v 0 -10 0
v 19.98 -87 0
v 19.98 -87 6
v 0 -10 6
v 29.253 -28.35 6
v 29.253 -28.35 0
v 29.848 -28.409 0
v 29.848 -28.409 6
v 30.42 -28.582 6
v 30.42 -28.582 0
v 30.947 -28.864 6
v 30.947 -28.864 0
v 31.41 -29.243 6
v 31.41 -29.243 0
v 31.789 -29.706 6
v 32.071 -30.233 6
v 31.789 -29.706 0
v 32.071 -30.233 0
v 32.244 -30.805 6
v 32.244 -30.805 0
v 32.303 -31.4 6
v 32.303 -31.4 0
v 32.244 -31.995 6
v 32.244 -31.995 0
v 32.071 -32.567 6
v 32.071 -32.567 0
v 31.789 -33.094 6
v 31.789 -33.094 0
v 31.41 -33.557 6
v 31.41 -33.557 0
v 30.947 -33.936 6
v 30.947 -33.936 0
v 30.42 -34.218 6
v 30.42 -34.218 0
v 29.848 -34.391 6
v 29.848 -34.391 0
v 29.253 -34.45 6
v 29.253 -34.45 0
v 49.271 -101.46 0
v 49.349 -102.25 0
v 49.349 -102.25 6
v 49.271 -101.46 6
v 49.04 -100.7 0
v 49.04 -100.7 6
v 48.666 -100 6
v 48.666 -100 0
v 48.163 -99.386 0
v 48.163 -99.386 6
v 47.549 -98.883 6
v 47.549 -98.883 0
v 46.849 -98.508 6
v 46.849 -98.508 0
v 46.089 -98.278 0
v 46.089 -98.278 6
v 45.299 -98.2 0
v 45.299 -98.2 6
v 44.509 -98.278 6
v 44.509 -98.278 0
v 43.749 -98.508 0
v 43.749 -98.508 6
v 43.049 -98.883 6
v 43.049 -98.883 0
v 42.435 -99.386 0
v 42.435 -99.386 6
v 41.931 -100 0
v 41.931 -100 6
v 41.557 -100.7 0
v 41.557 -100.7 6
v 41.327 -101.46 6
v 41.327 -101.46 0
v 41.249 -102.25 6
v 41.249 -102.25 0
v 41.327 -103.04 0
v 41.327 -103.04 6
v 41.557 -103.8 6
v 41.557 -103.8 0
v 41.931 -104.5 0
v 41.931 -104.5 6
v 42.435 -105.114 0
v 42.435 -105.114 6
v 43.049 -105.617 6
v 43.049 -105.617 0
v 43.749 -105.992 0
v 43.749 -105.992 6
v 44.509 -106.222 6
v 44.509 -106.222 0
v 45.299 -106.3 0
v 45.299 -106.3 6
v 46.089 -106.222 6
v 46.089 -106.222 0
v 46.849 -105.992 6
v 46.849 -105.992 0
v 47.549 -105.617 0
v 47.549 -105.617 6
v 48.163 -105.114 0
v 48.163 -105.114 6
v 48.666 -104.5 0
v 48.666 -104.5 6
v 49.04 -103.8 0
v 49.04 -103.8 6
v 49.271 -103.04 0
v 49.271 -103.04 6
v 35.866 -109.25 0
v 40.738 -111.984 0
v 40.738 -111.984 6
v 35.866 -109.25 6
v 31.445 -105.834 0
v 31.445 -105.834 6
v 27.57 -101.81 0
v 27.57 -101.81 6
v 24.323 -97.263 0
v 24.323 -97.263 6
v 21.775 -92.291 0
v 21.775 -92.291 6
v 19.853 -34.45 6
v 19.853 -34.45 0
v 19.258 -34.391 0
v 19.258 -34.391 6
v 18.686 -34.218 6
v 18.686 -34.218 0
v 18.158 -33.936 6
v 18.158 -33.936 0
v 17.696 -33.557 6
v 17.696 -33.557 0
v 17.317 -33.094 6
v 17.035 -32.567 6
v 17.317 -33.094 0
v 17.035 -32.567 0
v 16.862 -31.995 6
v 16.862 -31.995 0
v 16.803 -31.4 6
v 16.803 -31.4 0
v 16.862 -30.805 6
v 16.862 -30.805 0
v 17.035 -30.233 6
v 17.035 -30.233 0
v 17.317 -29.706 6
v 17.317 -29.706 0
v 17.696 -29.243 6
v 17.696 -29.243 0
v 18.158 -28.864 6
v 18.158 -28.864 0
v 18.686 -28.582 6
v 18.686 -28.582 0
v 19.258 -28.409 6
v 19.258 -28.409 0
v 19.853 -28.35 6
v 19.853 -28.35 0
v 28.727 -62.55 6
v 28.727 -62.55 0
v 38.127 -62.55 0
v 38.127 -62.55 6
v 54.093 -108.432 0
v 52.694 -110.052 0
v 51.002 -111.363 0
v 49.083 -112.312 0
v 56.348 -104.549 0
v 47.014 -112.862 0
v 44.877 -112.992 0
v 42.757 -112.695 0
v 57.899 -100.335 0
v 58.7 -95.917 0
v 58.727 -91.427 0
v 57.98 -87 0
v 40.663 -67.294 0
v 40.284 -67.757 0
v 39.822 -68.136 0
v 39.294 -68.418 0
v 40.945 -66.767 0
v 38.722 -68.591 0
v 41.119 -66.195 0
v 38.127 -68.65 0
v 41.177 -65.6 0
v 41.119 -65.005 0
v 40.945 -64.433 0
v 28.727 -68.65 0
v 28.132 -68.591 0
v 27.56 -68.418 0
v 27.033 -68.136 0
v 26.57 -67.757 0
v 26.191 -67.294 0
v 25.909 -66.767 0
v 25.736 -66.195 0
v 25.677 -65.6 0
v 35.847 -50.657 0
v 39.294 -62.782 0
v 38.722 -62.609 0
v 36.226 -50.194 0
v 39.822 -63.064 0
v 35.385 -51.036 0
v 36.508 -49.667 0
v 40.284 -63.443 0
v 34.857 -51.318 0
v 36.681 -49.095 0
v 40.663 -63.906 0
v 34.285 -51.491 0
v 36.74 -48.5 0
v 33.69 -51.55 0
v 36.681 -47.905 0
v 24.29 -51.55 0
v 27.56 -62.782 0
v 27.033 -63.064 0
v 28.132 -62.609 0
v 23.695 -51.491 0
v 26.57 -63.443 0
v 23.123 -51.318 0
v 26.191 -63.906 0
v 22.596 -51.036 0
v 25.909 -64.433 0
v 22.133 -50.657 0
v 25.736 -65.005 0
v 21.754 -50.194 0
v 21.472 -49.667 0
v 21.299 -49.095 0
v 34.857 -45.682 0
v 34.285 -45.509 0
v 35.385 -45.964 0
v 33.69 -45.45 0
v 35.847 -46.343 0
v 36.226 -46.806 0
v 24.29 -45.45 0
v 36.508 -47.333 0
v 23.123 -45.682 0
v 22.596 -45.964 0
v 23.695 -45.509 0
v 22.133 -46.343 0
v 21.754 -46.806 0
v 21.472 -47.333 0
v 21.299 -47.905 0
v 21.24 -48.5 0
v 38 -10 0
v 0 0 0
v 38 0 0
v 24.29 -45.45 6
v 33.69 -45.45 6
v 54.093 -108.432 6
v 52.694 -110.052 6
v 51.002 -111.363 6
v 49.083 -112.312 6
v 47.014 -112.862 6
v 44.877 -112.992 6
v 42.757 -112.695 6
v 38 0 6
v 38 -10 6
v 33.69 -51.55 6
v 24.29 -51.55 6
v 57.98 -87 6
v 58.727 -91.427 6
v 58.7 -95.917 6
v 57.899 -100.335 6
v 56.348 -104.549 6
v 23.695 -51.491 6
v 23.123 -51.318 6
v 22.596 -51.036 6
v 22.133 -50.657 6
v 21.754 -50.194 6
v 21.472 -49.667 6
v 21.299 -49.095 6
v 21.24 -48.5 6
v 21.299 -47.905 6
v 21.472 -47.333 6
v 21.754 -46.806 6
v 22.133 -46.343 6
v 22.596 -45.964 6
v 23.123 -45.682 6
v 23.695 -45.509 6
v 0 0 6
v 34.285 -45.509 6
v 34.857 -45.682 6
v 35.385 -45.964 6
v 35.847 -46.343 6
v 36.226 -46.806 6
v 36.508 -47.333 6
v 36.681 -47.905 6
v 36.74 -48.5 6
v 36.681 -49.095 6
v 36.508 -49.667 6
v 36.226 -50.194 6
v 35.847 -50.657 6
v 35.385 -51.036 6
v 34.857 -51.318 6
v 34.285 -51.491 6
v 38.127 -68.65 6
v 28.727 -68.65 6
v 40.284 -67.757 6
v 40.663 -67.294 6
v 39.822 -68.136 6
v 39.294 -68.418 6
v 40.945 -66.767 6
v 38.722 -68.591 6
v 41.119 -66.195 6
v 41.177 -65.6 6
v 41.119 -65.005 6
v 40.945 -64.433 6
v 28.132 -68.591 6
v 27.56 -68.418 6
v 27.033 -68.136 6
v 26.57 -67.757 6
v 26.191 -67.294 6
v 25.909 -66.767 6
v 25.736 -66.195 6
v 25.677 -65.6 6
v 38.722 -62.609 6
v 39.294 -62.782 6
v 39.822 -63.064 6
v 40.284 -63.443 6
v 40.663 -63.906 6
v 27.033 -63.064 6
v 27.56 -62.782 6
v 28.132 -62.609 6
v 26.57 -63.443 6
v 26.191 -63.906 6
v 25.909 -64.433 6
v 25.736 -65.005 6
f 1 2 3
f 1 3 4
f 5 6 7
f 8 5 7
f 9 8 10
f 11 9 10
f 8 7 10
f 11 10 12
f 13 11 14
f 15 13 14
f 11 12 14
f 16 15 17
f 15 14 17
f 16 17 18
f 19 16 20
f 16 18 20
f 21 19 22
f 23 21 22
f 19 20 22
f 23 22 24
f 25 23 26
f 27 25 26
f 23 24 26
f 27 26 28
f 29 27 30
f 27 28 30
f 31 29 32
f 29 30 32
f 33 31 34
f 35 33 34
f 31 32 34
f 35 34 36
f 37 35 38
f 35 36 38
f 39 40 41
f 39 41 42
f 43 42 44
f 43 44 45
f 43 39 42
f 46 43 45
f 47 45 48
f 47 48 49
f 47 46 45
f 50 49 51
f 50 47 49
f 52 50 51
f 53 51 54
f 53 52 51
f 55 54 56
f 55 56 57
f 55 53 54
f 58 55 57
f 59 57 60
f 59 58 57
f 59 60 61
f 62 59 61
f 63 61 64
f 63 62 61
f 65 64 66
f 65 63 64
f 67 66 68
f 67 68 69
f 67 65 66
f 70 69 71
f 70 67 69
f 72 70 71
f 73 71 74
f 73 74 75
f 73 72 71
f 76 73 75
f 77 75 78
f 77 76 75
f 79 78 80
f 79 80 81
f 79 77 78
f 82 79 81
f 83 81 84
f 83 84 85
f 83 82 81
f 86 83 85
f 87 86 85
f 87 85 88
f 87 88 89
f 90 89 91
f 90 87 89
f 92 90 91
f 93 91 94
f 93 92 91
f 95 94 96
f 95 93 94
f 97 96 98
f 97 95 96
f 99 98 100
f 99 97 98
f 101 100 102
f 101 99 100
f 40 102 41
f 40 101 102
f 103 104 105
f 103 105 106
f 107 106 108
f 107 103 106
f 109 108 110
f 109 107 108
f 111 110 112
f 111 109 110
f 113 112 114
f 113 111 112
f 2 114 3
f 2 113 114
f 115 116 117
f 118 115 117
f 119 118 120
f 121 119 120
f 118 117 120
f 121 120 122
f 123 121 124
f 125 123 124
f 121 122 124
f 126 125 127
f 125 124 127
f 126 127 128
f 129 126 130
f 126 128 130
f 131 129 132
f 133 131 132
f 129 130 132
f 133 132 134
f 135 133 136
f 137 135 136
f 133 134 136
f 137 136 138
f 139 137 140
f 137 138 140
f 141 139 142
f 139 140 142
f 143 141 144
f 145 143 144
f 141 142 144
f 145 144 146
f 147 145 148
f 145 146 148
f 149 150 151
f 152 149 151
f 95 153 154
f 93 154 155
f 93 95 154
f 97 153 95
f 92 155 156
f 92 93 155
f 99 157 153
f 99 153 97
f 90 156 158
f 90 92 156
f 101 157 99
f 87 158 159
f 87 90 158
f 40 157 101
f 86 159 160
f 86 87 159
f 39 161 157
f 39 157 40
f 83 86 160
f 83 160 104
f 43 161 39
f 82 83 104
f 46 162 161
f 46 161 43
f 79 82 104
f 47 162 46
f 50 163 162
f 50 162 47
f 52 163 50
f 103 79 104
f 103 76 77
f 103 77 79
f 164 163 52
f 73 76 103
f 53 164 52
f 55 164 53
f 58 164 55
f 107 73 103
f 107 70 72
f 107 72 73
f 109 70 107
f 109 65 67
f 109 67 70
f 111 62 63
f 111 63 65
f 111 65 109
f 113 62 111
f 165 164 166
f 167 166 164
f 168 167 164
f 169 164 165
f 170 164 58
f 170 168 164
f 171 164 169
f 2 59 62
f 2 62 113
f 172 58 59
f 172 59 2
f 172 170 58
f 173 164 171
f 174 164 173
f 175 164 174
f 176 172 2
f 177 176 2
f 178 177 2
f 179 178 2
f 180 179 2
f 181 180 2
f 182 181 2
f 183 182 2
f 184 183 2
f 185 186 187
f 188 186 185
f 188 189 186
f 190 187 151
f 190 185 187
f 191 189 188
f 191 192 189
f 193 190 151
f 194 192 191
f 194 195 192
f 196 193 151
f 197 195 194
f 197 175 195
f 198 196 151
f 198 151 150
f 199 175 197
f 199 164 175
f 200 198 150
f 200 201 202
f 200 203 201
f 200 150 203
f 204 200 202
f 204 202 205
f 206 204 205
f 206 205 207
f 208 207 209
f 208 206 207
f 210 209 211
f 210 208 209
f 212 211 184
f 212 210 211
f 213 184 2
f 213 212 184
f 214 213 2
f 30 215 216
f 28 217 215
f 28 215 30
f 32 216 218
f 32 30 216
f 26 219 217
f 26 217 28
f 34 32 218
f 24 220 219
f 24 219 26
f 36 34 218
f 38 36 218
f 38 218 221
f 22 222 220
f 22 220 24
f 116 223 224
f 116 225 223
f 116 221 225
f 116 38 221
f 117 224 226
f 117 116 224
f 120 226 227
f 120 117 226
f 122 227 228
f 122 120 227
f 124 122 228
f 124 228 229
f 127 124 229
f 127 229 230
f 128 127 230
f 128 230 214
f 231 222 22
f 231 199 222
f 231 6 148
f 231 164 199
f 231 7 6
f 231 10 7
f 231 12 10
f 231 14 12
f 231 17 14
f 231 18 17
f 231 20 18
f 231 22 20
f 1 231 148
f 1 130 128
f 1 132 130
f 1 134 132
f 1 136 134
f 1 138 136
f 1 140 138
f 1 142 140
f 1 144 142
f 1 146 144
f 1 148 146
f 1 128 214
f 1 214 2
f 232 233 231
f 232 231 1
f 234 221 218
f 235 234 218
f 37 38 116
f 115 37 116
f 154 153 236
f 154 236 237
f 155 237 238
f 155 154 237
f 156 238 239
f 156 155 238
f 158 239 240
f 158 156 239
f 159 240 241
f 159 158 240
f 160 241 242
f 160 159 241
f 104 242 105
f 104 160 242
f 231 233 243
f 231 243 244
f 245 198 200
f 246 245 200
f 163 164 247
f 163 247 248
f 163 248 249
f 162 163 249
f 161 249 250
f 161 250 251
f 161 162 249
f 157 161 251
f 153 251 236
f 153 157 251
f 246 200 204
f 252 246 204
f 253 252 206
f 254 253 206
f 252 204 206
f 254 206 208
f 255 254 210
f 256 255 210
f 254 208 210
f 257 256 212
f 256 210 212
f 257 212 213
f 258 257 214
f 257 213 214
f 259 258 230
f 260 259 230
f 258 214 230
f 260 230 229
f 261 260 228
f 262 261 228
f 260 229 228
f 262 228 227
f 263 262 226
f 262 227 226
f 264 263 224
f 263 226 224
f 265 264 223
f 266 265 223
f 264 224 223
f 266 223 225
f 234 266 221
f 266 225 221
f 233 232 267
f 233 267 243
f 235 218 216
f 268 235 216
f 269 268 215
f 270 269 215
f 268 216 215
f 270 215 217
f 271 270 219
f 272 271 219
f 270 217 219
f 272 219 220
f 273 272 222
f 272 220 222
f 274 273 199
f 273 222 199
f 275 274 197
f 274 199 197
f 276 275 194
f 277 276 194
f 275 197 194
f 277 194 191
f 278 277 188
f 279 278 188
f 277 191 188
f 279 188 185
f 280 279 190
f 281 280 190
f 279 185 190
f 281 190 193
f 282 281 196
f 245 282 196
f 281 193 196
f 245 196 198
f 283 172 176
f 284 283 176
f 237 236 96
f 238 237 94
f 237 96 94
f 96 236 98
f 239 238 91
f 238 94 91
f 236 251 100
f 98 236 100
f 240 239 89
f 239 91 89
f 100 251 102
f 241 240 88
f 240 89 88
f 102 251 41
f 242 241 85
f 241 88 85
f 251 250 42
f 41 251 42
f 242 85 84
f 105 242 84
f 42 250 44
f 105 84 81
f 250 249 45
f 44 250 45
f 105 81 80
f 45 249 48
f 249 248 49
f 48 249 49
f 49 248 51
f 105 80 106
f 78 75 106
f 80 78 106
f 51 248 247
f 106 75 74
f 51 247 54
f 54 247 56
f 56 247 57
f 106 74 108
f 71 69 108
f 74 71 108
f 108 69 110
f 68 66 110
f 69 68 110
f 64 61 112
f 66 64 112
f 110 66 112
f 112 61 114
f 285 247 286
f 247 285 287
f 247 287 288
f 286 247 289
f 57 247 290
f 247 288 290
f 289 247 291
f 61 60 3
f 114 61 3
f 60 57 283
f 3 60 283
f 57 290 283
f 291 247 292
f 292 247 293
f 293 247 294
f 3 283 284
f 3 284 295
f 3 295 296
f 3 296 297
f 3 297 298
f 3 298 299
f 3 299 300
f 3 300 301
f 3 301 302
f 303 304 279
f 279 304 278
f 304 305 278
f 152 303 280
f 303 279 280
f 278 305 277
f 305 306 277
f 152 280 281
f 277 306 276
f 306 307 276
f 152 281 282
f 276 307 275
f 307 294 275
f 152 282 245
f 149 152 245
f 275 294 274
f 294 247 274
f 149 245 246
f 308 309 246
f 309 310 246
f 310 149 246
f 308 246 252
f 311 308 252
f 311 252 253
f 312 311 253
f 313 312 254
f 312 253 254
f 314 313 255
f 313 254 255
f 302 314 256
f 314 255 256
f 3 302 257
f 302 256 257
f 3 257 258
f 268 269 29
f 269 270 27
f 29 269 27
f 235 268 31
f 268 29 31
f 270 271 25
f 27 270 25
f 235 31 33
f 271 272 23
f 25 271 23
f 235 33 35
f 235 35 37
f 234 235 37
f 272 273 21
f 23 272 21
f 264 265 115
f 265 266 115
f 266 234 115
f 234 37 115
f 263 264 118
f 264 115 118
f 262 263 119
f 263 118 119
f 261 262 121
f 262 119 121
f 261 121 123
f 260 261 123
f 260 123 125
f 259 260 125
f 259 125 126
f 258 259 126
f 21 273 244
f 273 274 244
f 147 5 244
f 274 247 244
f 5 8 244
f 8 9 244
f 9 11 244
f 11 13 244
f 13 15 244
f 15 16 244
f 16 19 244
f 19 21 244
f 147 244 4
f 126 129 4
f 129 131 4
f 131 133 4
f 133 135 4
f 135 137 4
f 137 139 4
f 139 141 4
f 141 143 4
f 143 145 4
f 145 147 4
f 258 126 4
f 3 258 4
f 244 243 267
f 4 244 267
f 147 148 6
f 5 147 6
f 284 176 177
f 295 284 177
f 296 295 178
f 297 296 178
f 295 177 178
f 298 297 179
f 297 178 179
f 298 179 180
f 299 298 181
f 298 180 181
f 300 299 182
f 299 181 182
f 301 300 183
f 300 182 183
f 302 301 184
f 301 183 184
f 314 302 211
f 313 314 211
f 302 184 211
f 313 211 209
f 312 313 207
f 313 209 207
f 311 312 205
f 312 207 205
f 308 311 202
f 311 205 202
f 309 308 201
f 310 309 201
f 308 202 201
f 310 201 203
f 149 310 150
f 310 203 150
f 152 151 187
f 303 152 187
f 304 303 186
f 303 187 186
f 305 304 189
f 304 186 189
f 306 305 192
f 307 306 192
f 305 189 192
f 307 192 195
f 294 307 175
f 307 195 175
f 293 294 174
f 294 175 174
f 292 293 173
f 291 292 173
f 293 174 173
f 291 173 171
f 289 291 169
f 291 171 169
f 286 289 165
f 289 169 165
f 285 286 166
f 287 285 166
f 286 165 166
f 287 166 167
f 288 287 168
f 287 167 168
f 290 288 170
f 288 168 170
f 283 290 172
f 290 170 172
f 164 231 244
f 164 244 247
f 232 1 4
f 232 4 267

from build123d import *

# Parameters (mm, degrees)
SKETCH1_R           = 4.05
BOSS_EXTRUDE1_DEPTH = 6


with BuildPart() as part:
    # Sketch1 → Boss-Extrude1 (new body)
    with BuildSketch(Plane.XY):
        with BuildLine():
            Line((0, 0), (38, 0))
            Line((38, 0), (38, -10))
            Line((38, -10), (57.980052552, -87))
            ThreePointArc((57.980052552, -87), (58.395271252, -98.14362649), (54.093497988, -108.431851056))
            ThreePointArc((54.093497988, -108.431851056), (48.062167082, -112.638750827), (40.737765228, -111.984460623))
            ThreePointArc((40.737765228, -111.984460623), (27.569508693, -101.809733527), (19.980052552, -87))
            Line((19.980052552, -87), (0, -10))
            Line((0, -10), (0, 0))
        make_face()
        with Locations((45.2987713, -102.25)):
            Circle(SKETCH1_R, mode=Mode.SUBTRACT)
        with BuildLine():
            Line((24.290026276, -45.45), (33.690026276, -45.45))
            ThreePointArc((33.690026276, -45.45), (36.740026276, -48.5), (33.690026276, -51.55))
            Line((33.690026276, -51.55), (24.290026276, -51.55))
            ThreePointArc((24.290026276, -51.55), (21.240026276, -48.5), (24.290026276, -45.45))
        make_face(mode=Mode.SUBTRACT)
        with BuildLine():
            Line((28.72715483, -62.55), (38.12715483, -62.55))
            ThreePointArc((38.12715483, -62.55), (41.17715483, -65.6), (38.12715483, -68.65))
            Line((38.12715483, -68.65), (28.72715483, -68.65))
            ThreePointArc((28.72715483, -68.65), (25.67715483, -65.6), (28.72715483, -62.55))
        make_face(mode=Mode.SUBTRACT)
        with BuildLine():
            Line((19.852897722, -28.35), (29.252897722, -28.35))
            ThreePointArc((29.252897722, -28.35), (32.302897722, -31.4), (29.252897722, -34.45))
            Line((29.252897722, -34.45), (19.852897722, -34.45))
            ThreePointArc((19.852897722, -34.45), (16.802897722, -31.4), (19.852897722, -28.35))
        make_face(mode=Mode.SUBTRACT)
    extrude(amount=BOSS_EXTRUDE1_DEPTH)


solid = part.part
